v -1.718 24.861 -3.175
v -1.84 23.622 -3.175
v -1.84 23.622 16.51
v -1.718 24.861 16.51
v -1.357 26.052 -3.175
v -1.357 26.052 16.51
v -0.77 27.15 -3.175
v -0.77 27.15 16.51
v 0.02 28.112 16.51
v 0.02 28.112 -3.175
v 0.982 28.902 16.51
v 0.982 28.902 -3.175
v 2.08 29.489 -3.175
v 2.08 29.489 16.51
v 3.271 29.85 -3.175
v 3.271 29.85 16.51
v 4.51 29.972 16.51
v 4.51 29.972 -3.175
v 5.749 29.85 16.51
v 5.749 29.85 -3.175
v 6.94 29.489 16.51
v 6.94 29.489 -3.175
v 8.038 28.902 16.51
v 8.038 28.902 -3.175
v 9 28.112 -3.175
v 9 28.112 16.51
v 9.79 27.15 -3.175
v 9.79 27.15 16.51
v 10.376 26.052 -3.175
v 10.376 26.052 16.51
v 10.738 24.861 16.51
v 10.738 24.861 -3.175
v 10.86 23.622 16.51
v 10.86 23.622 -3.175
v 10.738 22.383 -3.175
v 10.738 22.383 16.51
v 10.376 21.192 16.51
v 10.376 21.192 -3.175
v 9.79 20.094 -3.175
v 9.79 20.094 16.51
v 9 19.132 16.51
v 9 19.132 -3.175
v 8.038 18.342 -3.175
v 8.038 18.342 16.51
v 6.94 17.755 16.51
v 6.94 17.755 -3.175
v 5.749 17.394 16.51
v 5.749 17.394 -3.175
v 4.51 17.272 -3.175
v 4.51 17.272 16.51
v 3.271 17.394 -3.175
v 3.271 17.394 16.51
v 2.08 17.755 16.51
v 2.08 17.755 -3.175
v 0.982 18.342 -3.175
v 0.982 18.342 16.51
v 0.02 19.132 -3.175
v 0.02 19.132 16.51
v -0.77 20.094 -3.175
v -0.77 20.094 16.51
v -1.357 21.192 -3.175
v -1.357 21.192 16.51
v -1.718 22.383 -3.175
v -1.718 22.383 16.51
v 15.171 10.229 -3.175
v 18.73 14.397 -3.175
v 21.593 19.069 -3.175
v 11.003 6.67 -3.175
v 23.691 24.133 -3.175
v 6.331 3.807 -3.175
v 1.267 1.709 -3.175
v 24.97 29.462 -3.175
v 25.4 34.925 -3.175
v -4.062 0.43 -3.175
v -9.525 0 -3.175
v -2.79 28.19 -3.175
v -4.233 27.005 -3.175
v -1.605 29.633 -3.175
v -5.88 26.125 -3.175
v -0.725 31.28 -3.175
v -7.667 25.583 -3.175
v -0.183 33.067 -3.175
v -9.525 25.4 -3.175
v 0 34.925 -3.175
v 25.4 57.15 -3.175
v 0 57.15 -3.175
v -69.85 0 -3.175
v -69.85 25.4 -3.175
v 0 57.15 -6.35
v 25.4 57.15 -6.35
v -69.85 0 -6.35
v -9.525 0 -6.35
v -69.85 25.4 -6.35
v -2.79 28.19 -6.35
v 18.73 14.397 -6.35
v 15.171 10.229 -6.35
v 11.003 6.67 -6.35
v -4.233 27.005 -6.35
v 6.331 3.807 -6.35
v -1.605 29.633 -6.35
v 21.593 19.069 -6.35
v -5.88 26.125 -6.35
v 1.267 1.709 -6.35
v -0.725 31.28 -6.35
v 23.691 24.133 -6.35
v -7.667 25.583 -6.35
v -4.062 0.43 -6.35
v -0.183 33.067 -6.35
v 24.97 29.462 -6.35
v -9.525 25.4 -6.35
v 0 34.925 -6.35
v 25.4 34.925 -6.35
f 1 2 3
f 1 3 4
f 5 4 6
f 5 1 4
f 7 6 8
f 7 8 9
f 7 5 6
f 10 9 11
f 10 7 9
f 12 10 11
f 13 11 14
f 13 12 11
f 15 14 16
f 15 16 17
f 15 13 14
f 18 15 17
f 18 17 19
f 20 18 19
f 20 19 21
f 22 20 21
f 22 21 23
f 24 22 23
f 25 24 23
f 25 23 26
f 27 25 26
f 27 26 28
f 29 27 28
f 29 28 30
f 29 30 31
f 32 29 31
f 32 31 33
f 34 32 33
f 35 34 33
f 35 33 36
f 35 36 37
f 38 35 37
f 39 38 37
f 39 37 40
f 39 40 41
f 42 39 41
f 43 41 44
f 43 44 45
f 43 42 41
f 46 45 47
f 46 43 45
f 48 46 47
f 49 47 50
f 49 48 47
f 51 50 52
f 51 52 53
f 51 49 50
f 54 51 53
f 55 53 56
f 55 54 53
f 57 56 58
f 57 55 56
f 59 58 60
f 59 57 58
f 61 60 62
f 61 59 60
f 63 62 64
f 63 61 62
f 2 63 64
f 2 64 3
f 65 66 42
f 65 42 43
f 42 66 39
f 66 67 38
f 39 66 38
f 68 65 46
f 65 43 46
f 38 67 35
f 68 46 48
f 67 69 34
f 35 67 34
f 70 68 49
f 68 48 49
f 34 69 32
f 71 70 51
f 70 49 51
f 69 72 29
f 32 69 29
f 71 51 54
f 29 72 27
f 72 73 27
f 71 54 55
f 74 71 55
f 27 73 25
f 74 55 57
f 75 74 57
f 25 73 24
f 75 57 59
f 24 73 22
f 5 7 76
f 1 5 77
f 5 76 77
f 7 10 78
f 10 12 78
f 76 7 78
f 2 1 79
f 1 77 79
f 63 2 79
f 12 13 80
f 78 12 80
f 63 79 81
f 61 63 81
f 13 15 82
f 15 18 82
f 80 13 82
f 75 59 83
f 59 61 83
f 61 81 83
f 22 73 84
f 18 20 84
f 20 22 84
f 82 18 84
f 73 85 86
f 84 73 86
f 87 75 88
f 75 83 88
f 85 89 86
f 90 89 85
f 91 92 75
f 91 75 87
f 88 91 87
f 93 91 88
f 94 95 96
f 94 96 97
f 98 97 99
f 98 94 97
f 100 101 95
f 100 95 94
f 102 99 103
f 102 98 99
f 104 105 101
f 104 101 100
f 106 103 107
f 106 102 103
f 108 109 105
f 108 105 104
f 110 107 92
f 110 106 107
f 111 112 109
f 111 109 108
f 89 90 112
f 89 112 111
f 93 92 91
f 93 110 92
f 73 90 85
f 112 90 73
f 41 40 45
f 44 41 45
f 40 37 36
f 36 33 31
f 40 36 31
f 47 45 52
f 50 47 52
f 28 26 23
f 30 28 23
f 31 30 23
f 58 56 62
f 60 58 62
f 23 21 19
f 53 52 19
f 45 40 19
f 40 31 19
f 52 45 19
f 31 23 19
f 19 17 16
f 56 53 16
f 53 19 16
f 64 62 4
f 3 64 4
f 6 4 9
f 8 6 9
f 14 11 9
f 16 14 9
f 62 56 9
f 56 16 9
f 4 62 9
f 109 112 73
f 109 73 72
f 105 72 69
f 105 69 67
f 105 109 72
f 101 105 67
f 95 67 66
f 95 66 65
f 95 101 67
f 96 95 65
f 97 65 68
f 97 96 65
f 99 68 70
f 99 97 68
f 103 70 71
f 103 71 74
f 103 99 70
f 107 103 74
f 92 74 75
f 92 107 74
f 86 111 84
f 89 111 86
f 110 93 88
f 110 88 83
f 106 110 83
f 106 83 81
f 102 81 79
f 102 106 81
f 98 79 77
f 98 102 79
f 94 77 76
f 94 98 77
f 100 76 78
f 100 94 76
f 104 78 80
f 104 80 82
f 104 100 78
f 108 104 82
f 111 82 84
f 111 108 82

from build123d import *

# Parameters (mm, degrees)
F0_R     = 6.35
F1_DEPTH = 22.86
F2_DEPTH = 3.175
F3_ANGLE = 180


with BuildPart() as f1:
    # F0 (on Top) → F1 (new body)
    with BuildSketch(Plane.XY):
        with Locations((-4.509694, 23.622)):
            Circle(F0_R)
    extrude(amount=-F1_DEPTH)

    # F0 (on Top) → F2 (join)
    with BuildSketch(Plane.XY):
        with BuildLine():
            Line((0, 57.15), (-25.4, 57.15))
            Line((-25.4, 57.15), (-25.4, 34.925))
            ThreePointArc((-25.4, 34.925), (-15.170704, 10.229296), (9.525, 0))
            Line((9.525, 0), (19.05, 0))
            Line((19.05, 0), (69.85, 0))
            Line((69.85, 0), (69.85, 25.4))
            Line((69.85, 25.4), (19.05, 25.4))
            Line((19.05, 25.4), (9.525, 25.4))
            ThreePointArc((9.525, 25.4), (2.789808, 28.189808), (0, 34.925))
            Line((0, 34.925), (0, 57.15))
        make_face()
        with Locations((-4.509694, 23.622)):
            Circle(F0_R, mode=Mode.SUBTRACT)
    extrude(amount=-F2_DEPTH)


with BuildPart() as f1_1:
    # F3: moved
    add(f1.part.rotate(Axis((0, 46.0375, -3.175), (0, 1, 0)), F3_ANGLE))


solid = f1_1.part
